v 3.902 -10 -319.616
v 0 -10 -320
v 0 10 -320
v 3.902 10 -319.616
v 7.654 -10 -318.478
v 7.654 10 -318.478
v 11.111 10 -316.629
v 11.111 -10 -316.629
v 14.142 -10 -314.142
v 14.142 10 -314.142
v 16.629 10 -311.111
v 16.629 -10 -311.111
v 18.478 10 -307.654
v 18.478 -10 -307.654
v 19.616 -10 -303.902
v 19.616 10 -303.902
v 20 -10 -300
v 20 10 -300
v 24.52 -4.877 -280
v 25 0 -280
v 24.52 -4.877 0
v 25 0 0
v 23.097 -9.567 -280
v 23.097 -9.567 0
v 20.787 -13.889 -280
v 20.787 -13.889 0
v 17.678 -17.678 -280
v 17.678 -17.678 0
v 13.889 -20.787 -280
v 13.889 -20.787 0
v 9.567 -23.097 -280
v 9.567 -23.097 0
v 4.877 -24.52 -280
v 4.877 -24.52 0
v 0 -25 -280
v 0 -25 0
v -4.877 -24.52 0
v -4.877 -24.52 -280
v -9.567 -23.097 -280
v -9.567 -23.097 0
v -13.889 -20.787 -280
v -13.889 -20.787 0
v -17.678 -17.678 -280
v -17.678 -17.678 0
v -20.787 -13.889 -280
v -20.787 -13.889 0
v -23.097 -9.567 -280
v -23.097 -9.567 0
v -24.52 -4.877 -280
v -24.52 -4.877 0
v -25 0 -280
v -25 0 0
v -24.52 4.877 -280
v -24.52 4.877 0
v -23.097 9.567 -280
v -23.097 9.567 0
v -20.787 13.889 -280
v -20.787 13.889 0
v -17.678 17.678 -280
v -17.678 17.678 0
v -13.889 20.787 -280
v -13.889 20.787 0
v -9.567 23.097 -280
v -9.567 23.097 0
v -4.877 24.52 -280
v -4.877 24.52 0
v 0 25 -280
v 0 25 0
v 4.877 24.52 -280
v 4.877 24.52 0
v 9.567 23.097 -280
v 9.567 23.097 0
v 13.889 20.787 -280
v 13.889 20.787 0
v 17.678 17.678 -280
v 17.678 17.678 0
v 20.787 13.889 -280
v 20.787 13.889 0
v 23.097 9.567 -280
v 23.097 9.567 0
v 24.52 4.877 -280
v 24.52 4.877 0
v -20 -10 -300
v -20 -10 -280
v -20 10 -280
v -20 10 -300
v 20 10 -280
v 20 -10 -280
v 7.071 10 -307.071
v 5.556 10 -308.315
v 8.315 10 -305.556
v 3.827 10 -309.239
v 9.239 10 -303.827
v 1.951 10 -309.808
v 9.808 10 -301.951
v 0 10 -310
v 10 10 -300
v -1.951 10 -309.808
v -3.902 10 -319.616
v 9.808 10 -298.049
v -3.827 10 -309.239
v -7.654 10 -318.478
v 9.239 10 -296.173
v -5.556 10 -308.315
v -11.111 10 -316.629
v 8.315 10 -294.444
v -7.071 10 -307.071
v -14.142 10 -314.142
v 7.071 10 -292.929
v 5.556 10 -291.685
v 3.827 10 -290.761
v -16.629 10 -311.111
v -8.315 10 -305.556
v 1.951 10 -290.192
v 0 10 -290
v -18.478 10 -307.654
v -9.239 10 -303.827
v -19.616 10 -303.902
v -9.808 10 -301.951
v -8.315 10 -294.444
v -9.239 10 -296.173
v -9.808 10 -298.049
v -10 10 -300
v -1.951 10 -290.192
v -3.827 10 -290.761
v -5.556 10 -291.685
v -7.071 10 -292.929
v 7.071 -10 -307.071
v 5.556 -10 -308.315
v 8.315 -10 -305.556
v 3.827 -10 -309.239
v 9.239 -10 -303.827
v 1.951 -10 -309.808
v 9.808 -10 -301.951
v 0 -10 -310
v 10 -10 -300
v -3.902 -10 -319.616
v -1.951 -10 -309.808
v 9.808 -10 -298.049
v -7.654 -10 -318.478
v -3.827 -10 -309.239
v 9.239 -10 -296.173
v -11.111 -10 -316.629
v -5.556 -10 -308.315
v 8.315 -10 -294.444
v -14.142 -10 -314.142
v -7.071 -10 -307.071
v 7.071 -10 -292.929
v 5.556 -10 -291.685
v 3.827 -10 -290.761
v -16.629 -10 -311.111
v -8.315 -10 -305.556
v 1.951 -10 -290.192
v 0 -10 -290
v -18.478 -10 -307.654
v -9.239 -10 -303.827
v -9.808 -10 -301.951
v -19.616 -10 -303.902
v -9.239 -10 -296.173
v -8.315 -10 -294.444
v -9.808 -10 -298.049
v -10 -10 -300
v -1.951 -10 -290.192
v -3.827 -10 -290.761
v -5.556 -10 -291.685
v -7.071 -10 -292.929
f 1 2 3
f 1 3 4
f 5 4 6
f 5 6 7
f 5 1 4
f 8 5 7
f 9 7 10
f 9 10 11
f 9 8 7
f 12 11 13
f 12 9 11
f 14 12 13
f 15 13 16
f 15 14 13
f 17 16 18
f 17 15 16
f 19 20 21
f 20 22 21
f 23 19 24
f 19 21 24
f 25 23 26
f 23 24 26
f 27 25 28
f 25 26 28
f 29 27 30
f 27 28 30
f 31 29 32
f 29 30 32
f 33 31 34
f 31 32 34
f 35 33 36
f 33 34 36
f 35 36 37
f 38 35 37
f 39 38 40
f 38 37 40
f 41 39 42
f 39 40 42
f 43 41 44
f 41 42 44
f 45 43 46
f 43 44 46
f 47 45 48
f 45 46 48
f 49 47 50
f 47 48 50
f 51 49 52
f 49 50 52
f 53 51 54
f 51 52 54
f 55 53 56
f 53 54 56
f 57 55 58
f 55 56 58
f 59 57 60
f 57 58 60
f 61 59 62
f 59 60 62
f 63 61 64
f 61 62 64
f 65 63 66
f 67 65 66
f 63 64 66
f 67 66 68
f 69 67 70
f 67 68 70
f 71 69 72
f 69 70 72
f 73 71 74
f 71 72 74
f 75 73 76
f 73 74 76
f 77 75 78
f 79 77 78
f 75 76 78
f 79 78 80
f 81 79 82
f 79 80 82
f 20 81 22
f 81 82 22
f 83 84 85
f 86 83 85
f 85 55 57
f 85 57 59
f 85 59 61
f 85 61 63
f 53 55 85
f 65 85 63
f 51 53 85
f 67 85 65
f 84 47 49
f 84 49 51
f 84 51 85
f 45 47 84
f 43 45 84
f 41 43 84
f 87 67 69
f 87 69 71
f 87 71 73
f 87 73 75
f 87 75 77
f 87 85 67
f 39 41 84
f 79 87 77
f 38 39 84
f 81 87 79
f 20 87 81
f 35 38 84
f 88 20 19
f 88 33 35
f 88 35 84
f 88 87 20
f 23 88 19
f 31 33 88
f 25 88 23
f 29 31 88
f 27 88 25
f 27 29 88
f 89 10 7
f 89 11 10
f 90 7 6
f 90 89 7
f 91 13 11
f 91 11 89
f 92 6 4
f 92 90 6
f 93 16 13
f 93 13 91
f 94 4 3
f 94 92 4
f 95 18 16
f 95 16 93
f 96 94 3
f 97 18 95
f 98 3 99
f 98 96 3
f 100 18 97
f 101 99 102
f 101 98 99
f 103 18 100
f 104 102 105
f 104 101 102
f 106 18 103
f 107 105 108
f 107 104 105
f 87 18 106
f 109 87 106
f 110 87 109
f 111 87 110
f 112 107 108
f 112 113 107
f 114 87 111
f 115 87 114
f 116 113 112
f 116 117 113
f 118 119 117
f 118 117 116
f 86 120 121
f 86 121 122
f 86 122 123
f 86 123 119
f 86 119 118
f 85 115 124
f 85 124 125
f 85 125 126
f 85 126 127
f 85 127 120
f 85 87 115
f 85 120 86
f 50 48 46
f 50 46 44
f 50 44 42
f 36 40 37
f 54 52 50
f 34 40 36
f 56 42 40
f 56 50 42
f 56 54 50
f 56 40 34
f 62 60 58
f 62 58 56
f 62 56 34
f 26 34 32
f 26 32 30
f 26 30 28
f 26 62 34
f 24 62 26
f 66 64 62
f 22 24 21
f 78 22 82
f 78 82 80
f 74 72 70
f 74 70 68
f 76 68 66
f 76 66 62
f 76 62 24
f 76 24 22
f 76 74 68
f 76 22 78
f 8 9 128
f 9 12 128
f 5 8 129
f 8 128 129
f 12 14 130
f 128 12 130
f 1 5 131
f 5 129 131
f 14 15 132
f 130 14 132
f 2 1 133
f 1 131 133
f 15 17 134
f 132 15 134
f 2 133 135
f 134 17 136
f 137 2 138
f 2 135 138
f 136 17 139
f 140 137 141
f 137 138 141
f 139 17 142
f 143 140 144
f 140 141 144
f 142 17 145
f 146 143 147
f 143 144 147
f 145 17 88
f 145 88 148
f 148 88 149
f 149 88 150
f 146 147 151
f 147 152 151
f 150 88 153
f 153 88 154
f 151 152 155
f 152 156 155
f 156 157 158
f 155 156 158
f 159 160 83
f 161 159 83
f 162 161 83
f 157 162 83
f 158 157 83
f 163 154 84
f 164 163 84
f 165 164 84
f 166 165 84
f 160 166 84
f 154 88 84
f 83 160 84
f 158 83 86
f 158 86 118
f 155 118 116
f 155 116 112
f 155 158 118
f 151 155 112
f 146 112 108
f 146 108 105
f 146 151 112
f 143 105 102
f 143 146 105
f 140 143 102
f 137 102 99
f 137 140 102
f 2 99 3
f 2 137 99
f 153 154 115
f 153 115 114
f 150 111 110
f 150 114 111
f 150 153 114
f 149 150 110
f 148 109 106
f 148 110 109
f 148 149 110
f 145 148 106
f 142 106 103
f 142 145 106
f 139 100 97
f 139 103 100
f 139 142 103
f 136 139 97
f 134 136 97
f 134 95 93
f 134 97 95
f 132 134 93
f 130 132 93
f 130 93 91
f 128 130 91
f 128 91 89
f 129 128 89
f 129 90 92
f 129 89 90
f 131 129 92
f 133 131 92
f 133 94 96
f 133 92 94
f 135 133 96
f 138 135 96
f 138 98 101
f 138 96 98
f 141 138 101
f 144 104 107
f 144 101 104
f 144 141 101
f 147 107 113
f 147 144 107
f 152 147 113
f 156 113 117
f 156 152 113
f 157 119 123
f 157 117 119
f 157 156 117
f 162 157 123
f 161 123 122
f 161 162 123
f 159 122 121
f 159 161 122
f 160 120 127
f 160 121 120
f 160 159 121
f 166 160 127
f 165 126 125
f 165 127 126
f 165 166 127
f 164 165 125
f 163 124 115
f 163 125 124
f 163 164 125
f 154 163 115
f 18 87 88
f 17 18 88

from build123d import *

# Parameters (mm, degrees)
SKETCH_1_R               = 25
EXTRUDE_1_DEPTH          = 30
SKETCH_2_R               = 25
EXTRUDE_2_DEPTH          = 250
SKETCH_3_W               = 40
SKETCH_3_H               = 10
EXTRUDE_4_DEPTH          = 40
CUT_EXTRUDE_1_DEPTH      = 323.877685819
CUT_EXTRUDE_1_DEPTH_BACK = 323.877685819
CUT_EXTRUDE_2_DEPTH      = 323.877685819
CUT_EXTRUDE_2_DEPTH_BACK = 323.877685819
SKETCH_7_R               = 10


with BuildPart() as part:
    # 스케치1 → 보스-돌출1 (new body)
    with BuildSketch(Plane.XY):
        Circle(SKETCH_1_R)
    extrude(amount=-EXTRUDE_1_DEPTH)

    # 스케치2 → 보스-돌출2 (add)
    with BuildSketch(Plane(origin=(0, 0, -30), x_dir=(-1, 0, 0), z_dir=(0, 0, -1))):
        with Locations(Location((0, 0, 0), (0, 0, 180))):
            Circle(SKETCH_2_R)
    extrude(amount=EXTRUDE_2_DEPTH)

    # 스케치3 → 보스-돌출4 (add)
    with BuildSketch(Plane(origin=(0, 0, -280), x_dir=(-1, 0, 0), z_dir=(0, 0, -1))):
        with Locations((0, -5)):
            Rectangle(SKETCH_3_W, SKETCH_3_H)
        with Locations((0, 5)):
            Rectangle(SKETCH_3_W, SKETCH_3_H)
    extrude(amount=EXTRUDE_4_DEPTH)

    # 스케치6 → 컷-돌출1 (cut, two sides: drawn at the far end of the back side and taken through both)
    with BuildSketch(Plane(origin=(0, 10, 0), x_dir=(1, 0, 0), z_dir=(0, 1, 0)).offset(-CUT_EXTRUDE_1_DEPTH_BACK)):
        with BuildLine():
            ThreePointArc((-20, 300), (-14.142135624, 314.142135624), (0, 320))
            Line((0, 320), (-20, 320))
            Line((-20, 320), (-20, 300))
        make_face()
        with BuildLine():
            Line((20, 320), (0, 320))
            ThreePointArc((0, 320), (14.142135624, 314.142135624), (20, 300))
            Line((20, 300), (20, 320))
        make_face()
    extrude(amount=CUT_EXTRUDE_1_DEPTH + CUT_EXTRUDE_1_DEPTH_BACK, mode=Mode.SUBTRACT)

    # 스케치7 → 컷-돌출2 (cut, two sides: drawn at the far end of the back side and taken through both)
    with BuildSketch(Plane(origin=(0, 10, 0), x_dir=(1, 0, 0), z_dir=(0, 1, 0)).offset(-CUT_EXTRUDE_2_DEPTH_BACK)):
        with Locations(Location((0, 300, 0), (0, 0, 270))):
            Circle(SKETCH_7_R)
    extrude(amount=CUT_EXTRUDE_2_DEPTH + CUT_EXTRUDE_2_DEPTH_BACK, mode=Mode.SUBTRACT)


solid = part.part
